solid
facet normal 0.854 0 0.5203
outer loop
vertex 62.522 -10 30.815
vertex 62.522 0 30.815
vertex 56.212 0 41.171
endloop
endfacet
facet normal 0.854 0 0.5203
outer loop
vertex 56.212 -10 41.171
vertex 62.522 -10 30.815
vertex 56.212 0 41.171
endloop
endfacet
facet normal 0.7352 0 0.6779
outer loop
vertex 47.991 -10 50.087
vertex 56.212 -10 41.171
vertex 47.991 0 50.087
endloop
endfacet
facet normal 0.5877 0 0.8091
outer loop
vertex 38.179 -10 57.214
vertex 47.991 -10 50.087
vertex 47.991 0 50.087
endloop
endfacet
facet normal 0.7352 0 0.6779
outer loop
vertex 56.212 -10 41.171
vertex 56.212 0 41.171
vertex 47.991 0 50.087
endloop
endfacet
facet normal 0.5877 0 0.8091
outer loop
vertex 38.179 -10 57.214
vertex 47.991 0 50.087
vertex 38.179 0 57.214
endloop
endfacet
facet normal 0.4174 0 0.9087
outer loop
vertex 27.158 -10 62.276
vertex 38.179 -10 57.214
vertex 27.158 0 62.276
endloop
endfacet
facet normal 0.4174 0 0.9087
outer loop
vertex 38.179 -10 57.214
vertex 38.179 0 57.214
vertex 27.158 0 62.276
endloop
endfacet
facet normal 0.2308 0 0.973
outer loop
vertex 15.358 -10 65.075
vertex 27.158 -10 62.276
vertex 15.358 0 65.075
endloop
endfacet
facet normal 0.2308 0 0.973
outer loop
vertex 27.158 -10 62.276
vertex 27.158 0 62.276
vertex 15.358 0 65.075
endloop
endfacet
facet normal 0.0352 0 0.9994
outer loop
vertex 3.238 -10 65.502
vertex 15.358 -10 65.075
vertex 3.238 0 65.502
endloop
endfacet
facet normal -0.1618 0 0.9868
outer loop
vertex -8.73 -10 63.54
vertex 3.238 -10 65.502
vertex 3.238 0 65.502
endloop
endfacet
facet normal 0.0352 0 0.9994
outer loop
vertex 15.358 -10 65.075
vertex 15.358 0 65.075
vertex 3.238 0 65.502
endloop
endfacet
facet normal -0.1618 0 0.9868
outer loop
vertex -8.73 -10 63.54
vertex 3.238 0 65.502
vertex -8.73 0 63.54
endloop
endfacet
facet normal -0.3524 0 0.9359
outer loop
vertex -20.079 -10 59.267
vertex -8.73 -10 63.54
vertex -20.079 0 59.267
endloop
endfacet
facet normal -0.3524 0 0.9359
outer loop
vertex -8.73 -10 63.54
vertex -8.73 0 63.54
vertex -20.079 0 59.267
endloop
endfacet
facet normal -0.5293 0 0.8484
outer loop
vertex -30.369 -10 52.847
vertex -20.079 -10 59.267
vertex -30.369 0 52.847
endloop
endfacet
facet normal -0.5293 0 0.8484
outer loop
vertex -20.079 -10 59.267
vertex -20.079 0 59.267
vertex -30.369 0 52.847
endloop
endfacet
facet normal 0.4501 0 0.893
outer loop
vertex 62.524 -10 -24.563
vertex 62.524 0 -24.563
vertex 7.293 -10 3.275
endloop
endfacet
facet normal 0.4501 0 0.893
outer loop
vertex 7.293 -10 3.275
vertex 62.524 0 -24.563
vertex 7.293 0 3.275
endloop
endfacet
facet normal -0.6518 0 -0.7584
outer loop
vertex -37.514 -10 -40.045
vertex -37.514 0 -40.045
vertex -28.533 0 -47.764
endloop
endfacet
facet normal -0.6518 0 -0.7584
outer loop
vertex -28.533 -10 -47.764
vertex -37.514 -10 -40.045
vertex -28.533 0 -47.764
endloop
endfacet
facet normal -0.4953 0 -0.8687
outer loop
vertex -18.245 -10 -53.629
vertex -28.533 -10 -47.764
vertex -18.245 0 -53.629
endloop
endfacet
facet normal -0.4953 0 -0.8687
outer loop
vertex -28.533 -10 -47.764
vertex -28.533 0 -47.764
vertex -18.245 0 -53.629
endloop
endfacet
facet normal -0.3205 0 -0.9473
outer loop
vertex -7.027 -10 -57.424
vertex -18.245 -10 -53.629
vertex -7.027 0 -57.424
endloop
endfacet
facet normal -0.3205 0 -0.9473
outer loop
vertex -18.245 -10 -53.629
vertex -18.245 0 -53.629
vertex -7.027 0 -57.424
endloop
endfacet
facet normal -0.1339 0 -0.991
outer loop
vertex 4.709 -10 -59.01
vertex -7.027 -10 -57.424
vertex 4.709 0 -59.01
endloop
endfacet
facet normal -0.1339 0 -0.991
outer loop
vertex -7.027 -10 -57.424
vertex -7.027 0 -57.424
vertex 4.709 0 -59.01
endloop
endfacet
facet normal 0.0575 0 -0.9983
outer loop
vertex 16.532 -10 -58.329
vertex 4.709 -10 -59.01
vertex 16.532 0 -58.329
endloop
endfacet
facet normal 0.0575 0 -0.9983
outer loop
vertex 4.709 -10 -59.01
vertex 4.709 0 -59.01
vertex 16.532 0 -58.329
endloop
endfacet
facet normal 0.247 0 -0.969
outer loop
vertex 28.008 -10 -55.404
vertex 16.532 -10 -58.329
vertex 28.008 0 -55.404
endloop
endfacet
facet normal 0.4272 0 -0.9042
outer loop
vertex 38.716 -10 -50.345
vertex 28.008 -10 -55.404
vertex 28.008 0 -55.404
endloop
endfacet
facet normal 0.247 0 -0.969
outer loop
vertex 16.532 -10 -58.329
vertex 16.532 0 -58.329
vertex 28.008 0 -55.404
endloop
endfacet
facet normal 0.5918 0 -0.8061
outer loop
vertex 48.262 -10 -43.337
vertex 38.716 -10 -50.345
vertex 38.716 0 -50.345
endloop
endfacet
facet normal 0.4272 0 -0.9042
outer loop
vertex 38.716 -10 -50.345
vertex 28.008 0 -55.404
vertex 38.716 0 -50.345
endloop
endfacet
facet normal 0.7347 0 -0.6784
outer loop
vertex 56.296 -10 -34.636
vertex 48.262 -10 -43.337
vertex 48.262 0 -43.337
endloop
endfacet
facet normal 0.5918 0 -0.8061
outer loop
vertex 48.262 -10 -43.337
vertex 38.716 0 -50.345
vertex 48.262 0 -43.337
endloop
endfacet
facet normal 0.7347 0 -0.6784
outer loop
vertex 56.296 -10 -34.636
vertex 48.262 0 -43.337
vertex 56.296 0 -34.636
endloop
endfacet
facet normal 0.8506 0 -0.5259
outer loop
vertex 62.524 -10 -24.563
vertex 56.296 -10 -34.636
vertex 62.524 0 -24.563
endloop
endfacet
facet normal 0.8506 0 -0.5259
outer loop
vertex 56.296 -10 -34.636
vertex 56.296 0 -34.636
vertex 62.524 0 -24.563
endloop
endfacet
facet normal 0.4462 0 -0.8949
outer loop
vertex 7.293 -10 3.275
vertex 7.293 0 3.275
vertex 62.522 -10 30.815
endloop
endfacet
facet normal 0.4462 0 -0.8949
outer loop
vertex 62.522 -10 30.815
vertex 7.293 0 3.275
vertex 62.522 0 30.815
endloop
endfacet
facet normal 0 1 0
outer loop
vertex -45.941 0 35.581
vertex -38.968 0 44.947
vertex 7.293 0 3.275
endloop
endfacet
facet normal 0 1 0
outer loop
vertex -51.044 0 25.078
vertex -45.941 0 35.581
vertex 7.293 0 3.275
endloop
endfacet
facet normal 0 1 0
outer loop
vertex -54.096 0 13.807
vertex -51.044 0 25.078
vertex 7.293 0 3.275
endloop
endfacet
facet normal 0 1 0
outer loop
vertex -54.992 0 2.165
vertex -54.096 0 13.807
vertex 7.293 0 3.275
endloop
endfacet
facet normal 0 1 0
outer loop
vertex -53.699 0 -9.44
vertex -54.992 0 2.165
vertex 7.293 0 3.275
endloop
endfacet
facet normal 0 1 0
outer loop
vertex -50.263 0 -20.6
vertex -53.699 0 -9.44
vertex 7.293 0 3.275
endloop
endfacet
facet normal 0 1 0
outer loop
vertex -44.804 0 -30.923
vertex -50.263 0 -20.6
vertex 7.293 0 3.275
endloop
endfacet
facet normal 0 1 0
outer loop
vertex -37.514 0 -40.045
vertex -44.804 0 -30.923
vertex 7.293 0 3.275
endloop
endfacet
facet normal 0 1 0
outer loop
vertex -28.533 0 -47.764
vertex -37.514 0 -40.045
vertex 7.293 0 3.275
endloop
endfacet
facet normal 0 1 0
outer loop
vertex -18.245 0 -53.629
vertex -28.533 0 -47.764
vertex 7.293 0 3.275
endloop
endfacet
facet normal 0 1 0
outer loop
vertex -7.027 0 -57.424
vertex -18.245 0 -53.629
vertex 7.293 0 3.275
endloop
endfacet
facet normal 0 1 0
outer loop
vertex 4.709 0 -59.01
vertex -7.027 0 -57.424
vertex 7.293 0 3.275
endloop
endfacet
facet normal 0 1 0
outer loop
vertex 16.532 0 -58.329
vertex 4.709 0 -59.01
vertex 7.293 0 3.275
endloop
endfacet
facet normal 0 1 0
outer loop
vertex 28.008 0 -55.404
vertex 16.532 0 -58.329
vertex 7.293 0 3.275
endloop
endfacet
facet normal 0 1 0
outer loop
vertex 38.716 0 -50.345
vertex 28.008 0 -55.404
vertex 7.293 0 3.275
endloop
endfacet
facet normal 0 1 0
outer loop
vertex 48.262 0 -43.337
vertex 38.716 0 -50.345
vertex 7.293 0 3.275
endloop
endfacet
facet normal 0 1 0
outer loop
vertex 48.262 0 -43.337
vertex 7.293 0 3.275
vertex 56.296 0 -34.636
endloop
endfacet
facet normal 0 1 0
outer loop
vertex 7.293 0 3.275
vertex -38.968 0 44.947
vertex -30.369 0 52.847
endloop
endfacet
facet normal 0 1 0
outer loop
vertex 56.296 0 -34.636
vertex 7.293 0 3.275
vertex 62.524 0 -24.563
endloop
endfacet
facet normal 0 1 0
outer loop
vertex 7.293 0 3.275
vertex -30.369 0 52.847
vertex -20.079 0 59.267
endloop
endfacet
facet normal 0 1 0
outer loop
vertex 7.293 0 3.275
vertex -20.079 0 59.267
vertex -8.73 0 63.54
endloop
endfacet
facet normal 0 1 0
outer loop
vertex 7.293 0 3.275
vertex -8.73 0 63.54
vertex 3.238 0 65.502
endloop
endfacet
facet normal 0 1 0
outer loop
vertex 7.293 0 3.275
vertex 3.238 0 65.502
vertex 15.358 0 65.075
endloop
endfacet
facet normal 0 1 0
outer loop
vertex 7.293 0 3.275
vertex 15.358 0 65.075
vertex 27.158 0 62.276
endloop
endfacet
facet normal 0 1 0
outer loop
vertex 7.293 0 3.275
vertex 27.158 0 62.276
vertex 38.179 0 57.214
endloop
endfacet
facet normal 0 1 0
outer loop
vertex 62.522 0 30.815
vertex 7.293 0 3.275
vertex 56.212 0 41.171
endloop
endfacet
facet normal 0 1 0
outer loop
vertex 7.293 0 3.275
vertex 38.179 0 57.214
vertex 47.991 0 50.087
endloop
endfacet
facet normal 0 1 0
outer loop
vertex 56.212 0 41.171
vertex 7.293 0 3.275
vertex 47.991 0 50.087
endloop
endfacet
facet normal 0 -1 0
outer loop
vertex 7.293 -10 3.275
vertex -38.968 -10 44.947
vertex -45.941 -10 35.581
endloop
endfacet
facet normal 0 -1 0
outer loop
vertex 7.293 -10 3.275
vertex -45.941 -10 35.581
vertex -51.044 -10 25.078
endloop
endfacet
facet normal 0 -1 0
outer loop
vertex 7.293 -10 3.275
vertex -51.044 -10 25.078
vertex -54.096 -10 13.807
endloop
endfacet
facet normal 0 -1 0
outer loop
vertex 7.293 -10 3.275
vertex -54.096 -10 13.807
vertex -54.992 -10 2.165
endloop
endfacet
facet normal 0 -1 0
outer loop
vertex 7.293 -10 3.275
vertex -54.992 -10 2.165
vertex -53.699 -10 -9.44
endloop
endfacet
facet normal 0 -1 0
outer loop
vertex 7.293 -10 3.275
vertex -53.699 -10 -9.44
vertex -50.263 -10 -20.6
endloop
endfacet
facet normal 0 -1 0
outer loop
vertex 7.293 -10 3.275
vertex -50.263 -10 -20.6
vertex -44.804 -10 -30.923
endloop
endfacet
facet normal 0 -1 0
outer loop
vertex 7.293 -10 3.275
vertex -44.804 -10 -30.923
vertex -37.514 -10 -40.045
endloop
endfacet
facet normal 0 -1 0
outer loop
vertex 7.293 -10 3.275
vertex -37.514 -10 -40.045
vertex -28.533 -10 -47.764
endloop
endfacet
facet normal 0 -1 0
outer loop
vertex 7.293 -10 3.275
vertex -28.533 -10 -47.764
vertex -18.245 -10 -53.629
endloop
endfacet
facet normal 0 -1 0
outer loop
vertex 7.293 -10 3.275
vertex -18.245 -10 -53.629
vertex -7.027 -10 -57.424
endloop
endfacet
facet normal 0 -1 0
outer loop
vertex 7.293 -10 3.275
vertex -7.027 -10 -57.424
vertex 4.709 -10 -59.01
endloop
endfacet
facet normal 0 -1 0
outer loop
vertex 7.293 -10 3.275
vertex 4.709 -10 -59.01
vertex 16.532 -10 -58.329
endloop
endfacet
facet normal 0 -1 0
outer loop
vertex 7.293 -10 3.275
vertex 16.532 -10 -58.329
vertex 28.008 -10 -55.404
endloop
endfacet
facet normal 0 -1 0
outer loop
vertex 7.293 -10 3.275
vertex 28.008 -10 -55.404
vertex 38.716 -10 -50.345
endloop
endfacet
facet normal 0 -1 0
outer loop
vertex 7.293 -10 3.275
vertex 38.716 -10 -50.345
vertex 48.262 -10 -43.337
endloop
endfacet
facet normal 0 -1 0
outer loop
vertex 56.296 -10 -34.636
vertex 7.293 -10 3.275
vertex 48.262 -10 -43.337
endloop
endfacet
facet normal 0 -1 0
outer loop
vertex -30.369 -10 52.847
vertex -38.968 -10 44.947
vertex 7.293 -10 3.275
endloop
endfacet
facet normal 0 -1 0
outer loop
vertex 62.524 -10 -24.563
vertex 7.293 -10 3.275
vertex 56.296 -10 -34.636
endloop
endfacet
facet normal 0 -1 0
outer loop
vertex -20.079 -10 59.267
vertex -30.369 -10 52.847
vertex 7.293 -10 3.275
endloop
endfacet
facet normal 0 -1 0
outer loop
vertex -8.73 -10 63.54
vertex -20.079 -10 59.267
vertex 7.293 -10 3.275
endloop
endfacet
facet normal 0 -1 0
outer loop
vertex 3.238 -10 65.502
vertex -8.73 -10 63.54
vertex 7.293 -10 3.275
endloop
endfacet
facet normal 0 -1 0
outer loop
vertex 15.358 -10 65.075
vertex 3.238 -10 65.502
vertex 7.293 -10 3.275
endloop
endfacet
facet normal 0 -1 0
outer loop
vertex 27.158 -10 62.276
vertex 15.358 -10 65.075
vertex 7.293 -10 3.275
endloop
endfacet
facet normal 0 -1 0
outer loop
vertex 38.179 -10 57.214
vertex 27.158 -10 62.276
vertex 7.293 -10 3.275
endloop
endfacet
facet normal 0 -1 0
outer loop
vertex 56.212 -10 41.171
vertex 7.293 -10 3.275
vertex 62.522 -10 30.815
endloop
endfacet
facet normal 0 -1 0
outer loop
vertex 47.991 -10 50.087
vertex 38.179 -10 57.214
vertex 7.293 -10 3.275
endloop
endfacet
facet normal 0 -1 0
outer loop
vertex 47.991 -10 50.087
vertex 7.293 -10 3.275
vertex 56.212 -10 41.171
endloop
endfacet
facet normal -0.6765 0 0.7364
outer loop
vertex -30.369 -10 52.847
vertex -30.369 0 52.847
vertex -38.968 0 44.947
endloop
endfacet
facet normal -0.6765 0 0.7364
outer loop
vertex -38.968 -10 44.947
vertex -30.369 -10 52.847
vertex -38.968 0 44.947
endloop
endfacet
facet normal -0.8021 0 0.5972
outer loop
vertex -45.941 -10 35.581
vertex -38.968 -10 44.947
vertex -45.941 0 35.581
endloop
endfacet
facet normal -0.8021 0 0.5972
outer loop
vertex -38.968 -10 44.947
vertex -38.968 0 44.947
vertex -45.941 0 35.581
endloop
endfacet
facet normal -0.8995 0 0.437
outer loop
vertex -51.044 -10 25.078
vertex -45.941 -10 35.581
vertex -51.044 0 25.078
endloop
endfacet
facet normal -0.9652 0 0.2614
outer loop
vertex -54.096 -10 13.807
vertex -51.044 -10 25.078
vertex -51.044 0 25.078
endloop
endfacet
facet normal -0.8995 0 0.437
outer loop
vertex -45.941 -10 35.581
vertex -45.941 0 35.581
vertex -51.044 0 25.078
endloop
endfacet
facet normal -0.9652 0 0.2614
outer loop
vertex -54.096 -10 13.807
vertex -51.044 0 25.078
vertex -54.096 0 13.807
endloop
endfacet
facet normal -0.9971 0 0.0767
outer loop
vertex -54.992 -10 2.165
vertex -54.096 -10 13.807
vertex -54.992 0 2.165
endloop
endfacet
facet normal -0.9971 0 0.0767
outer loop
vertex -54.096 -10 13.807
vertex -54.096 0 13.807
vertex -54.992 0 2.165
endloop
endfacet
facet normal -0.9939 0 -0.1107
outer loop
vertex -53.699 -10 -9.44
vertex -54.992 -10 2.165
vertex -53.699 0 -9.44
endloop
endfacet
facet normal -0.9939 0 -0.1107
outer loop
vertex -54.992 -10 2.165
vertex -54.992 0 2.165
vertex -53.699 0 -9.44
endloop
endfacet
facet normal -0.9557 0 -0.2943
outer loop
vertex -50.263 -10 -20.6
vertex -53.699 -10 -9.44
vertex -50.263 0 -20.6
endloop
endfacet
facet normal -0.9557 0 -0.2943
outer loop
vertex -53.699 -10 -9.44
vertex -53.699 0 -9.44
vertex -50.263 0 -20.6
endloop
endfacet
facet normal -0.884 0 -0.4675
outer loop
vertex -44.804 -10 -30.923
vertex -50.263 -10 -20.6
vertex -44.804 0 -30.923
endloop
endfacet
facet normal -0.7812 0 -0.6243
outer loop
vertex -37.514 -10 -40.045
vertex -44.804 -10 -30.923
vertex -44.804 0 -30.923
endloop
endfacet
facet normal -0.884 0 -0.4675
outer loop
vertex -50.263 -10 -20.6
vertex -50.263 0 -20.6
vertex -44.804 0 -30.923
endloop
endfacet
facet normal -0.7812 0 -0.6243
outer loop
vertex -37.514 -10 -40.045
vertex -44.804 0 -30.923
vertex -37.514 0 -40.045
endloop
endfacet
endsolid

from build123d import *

# Parameters (mm, degrees)
F1_DEPTH = 10


with BuildPart() as f1:
    # F0 (on Front) → F1 (new body)
    with BuildSketch(Plane.XZ):
        with BuildLine():
            Line((7.292911, 3.274544), (62.522121, 30.814715))
            ThreePointArc((62.522121, 30.814715), (21.327258, 63.967445), (-30.368621, 52.847356))
            ThreePointArc((-30.368621, 52.847356), (-54.817622, 8.007093), (-37.51418, -40.044896))
            ThreePointArc((-37.51418, -40.044896), (16.53236, -58.328587), (62.523633, -24.562854))
            Line((62.523633, -24.562854), (7.292911, 3.274544))
        make_face()
    extrude(amount=F1_DEPTH)


solid = f1.part
